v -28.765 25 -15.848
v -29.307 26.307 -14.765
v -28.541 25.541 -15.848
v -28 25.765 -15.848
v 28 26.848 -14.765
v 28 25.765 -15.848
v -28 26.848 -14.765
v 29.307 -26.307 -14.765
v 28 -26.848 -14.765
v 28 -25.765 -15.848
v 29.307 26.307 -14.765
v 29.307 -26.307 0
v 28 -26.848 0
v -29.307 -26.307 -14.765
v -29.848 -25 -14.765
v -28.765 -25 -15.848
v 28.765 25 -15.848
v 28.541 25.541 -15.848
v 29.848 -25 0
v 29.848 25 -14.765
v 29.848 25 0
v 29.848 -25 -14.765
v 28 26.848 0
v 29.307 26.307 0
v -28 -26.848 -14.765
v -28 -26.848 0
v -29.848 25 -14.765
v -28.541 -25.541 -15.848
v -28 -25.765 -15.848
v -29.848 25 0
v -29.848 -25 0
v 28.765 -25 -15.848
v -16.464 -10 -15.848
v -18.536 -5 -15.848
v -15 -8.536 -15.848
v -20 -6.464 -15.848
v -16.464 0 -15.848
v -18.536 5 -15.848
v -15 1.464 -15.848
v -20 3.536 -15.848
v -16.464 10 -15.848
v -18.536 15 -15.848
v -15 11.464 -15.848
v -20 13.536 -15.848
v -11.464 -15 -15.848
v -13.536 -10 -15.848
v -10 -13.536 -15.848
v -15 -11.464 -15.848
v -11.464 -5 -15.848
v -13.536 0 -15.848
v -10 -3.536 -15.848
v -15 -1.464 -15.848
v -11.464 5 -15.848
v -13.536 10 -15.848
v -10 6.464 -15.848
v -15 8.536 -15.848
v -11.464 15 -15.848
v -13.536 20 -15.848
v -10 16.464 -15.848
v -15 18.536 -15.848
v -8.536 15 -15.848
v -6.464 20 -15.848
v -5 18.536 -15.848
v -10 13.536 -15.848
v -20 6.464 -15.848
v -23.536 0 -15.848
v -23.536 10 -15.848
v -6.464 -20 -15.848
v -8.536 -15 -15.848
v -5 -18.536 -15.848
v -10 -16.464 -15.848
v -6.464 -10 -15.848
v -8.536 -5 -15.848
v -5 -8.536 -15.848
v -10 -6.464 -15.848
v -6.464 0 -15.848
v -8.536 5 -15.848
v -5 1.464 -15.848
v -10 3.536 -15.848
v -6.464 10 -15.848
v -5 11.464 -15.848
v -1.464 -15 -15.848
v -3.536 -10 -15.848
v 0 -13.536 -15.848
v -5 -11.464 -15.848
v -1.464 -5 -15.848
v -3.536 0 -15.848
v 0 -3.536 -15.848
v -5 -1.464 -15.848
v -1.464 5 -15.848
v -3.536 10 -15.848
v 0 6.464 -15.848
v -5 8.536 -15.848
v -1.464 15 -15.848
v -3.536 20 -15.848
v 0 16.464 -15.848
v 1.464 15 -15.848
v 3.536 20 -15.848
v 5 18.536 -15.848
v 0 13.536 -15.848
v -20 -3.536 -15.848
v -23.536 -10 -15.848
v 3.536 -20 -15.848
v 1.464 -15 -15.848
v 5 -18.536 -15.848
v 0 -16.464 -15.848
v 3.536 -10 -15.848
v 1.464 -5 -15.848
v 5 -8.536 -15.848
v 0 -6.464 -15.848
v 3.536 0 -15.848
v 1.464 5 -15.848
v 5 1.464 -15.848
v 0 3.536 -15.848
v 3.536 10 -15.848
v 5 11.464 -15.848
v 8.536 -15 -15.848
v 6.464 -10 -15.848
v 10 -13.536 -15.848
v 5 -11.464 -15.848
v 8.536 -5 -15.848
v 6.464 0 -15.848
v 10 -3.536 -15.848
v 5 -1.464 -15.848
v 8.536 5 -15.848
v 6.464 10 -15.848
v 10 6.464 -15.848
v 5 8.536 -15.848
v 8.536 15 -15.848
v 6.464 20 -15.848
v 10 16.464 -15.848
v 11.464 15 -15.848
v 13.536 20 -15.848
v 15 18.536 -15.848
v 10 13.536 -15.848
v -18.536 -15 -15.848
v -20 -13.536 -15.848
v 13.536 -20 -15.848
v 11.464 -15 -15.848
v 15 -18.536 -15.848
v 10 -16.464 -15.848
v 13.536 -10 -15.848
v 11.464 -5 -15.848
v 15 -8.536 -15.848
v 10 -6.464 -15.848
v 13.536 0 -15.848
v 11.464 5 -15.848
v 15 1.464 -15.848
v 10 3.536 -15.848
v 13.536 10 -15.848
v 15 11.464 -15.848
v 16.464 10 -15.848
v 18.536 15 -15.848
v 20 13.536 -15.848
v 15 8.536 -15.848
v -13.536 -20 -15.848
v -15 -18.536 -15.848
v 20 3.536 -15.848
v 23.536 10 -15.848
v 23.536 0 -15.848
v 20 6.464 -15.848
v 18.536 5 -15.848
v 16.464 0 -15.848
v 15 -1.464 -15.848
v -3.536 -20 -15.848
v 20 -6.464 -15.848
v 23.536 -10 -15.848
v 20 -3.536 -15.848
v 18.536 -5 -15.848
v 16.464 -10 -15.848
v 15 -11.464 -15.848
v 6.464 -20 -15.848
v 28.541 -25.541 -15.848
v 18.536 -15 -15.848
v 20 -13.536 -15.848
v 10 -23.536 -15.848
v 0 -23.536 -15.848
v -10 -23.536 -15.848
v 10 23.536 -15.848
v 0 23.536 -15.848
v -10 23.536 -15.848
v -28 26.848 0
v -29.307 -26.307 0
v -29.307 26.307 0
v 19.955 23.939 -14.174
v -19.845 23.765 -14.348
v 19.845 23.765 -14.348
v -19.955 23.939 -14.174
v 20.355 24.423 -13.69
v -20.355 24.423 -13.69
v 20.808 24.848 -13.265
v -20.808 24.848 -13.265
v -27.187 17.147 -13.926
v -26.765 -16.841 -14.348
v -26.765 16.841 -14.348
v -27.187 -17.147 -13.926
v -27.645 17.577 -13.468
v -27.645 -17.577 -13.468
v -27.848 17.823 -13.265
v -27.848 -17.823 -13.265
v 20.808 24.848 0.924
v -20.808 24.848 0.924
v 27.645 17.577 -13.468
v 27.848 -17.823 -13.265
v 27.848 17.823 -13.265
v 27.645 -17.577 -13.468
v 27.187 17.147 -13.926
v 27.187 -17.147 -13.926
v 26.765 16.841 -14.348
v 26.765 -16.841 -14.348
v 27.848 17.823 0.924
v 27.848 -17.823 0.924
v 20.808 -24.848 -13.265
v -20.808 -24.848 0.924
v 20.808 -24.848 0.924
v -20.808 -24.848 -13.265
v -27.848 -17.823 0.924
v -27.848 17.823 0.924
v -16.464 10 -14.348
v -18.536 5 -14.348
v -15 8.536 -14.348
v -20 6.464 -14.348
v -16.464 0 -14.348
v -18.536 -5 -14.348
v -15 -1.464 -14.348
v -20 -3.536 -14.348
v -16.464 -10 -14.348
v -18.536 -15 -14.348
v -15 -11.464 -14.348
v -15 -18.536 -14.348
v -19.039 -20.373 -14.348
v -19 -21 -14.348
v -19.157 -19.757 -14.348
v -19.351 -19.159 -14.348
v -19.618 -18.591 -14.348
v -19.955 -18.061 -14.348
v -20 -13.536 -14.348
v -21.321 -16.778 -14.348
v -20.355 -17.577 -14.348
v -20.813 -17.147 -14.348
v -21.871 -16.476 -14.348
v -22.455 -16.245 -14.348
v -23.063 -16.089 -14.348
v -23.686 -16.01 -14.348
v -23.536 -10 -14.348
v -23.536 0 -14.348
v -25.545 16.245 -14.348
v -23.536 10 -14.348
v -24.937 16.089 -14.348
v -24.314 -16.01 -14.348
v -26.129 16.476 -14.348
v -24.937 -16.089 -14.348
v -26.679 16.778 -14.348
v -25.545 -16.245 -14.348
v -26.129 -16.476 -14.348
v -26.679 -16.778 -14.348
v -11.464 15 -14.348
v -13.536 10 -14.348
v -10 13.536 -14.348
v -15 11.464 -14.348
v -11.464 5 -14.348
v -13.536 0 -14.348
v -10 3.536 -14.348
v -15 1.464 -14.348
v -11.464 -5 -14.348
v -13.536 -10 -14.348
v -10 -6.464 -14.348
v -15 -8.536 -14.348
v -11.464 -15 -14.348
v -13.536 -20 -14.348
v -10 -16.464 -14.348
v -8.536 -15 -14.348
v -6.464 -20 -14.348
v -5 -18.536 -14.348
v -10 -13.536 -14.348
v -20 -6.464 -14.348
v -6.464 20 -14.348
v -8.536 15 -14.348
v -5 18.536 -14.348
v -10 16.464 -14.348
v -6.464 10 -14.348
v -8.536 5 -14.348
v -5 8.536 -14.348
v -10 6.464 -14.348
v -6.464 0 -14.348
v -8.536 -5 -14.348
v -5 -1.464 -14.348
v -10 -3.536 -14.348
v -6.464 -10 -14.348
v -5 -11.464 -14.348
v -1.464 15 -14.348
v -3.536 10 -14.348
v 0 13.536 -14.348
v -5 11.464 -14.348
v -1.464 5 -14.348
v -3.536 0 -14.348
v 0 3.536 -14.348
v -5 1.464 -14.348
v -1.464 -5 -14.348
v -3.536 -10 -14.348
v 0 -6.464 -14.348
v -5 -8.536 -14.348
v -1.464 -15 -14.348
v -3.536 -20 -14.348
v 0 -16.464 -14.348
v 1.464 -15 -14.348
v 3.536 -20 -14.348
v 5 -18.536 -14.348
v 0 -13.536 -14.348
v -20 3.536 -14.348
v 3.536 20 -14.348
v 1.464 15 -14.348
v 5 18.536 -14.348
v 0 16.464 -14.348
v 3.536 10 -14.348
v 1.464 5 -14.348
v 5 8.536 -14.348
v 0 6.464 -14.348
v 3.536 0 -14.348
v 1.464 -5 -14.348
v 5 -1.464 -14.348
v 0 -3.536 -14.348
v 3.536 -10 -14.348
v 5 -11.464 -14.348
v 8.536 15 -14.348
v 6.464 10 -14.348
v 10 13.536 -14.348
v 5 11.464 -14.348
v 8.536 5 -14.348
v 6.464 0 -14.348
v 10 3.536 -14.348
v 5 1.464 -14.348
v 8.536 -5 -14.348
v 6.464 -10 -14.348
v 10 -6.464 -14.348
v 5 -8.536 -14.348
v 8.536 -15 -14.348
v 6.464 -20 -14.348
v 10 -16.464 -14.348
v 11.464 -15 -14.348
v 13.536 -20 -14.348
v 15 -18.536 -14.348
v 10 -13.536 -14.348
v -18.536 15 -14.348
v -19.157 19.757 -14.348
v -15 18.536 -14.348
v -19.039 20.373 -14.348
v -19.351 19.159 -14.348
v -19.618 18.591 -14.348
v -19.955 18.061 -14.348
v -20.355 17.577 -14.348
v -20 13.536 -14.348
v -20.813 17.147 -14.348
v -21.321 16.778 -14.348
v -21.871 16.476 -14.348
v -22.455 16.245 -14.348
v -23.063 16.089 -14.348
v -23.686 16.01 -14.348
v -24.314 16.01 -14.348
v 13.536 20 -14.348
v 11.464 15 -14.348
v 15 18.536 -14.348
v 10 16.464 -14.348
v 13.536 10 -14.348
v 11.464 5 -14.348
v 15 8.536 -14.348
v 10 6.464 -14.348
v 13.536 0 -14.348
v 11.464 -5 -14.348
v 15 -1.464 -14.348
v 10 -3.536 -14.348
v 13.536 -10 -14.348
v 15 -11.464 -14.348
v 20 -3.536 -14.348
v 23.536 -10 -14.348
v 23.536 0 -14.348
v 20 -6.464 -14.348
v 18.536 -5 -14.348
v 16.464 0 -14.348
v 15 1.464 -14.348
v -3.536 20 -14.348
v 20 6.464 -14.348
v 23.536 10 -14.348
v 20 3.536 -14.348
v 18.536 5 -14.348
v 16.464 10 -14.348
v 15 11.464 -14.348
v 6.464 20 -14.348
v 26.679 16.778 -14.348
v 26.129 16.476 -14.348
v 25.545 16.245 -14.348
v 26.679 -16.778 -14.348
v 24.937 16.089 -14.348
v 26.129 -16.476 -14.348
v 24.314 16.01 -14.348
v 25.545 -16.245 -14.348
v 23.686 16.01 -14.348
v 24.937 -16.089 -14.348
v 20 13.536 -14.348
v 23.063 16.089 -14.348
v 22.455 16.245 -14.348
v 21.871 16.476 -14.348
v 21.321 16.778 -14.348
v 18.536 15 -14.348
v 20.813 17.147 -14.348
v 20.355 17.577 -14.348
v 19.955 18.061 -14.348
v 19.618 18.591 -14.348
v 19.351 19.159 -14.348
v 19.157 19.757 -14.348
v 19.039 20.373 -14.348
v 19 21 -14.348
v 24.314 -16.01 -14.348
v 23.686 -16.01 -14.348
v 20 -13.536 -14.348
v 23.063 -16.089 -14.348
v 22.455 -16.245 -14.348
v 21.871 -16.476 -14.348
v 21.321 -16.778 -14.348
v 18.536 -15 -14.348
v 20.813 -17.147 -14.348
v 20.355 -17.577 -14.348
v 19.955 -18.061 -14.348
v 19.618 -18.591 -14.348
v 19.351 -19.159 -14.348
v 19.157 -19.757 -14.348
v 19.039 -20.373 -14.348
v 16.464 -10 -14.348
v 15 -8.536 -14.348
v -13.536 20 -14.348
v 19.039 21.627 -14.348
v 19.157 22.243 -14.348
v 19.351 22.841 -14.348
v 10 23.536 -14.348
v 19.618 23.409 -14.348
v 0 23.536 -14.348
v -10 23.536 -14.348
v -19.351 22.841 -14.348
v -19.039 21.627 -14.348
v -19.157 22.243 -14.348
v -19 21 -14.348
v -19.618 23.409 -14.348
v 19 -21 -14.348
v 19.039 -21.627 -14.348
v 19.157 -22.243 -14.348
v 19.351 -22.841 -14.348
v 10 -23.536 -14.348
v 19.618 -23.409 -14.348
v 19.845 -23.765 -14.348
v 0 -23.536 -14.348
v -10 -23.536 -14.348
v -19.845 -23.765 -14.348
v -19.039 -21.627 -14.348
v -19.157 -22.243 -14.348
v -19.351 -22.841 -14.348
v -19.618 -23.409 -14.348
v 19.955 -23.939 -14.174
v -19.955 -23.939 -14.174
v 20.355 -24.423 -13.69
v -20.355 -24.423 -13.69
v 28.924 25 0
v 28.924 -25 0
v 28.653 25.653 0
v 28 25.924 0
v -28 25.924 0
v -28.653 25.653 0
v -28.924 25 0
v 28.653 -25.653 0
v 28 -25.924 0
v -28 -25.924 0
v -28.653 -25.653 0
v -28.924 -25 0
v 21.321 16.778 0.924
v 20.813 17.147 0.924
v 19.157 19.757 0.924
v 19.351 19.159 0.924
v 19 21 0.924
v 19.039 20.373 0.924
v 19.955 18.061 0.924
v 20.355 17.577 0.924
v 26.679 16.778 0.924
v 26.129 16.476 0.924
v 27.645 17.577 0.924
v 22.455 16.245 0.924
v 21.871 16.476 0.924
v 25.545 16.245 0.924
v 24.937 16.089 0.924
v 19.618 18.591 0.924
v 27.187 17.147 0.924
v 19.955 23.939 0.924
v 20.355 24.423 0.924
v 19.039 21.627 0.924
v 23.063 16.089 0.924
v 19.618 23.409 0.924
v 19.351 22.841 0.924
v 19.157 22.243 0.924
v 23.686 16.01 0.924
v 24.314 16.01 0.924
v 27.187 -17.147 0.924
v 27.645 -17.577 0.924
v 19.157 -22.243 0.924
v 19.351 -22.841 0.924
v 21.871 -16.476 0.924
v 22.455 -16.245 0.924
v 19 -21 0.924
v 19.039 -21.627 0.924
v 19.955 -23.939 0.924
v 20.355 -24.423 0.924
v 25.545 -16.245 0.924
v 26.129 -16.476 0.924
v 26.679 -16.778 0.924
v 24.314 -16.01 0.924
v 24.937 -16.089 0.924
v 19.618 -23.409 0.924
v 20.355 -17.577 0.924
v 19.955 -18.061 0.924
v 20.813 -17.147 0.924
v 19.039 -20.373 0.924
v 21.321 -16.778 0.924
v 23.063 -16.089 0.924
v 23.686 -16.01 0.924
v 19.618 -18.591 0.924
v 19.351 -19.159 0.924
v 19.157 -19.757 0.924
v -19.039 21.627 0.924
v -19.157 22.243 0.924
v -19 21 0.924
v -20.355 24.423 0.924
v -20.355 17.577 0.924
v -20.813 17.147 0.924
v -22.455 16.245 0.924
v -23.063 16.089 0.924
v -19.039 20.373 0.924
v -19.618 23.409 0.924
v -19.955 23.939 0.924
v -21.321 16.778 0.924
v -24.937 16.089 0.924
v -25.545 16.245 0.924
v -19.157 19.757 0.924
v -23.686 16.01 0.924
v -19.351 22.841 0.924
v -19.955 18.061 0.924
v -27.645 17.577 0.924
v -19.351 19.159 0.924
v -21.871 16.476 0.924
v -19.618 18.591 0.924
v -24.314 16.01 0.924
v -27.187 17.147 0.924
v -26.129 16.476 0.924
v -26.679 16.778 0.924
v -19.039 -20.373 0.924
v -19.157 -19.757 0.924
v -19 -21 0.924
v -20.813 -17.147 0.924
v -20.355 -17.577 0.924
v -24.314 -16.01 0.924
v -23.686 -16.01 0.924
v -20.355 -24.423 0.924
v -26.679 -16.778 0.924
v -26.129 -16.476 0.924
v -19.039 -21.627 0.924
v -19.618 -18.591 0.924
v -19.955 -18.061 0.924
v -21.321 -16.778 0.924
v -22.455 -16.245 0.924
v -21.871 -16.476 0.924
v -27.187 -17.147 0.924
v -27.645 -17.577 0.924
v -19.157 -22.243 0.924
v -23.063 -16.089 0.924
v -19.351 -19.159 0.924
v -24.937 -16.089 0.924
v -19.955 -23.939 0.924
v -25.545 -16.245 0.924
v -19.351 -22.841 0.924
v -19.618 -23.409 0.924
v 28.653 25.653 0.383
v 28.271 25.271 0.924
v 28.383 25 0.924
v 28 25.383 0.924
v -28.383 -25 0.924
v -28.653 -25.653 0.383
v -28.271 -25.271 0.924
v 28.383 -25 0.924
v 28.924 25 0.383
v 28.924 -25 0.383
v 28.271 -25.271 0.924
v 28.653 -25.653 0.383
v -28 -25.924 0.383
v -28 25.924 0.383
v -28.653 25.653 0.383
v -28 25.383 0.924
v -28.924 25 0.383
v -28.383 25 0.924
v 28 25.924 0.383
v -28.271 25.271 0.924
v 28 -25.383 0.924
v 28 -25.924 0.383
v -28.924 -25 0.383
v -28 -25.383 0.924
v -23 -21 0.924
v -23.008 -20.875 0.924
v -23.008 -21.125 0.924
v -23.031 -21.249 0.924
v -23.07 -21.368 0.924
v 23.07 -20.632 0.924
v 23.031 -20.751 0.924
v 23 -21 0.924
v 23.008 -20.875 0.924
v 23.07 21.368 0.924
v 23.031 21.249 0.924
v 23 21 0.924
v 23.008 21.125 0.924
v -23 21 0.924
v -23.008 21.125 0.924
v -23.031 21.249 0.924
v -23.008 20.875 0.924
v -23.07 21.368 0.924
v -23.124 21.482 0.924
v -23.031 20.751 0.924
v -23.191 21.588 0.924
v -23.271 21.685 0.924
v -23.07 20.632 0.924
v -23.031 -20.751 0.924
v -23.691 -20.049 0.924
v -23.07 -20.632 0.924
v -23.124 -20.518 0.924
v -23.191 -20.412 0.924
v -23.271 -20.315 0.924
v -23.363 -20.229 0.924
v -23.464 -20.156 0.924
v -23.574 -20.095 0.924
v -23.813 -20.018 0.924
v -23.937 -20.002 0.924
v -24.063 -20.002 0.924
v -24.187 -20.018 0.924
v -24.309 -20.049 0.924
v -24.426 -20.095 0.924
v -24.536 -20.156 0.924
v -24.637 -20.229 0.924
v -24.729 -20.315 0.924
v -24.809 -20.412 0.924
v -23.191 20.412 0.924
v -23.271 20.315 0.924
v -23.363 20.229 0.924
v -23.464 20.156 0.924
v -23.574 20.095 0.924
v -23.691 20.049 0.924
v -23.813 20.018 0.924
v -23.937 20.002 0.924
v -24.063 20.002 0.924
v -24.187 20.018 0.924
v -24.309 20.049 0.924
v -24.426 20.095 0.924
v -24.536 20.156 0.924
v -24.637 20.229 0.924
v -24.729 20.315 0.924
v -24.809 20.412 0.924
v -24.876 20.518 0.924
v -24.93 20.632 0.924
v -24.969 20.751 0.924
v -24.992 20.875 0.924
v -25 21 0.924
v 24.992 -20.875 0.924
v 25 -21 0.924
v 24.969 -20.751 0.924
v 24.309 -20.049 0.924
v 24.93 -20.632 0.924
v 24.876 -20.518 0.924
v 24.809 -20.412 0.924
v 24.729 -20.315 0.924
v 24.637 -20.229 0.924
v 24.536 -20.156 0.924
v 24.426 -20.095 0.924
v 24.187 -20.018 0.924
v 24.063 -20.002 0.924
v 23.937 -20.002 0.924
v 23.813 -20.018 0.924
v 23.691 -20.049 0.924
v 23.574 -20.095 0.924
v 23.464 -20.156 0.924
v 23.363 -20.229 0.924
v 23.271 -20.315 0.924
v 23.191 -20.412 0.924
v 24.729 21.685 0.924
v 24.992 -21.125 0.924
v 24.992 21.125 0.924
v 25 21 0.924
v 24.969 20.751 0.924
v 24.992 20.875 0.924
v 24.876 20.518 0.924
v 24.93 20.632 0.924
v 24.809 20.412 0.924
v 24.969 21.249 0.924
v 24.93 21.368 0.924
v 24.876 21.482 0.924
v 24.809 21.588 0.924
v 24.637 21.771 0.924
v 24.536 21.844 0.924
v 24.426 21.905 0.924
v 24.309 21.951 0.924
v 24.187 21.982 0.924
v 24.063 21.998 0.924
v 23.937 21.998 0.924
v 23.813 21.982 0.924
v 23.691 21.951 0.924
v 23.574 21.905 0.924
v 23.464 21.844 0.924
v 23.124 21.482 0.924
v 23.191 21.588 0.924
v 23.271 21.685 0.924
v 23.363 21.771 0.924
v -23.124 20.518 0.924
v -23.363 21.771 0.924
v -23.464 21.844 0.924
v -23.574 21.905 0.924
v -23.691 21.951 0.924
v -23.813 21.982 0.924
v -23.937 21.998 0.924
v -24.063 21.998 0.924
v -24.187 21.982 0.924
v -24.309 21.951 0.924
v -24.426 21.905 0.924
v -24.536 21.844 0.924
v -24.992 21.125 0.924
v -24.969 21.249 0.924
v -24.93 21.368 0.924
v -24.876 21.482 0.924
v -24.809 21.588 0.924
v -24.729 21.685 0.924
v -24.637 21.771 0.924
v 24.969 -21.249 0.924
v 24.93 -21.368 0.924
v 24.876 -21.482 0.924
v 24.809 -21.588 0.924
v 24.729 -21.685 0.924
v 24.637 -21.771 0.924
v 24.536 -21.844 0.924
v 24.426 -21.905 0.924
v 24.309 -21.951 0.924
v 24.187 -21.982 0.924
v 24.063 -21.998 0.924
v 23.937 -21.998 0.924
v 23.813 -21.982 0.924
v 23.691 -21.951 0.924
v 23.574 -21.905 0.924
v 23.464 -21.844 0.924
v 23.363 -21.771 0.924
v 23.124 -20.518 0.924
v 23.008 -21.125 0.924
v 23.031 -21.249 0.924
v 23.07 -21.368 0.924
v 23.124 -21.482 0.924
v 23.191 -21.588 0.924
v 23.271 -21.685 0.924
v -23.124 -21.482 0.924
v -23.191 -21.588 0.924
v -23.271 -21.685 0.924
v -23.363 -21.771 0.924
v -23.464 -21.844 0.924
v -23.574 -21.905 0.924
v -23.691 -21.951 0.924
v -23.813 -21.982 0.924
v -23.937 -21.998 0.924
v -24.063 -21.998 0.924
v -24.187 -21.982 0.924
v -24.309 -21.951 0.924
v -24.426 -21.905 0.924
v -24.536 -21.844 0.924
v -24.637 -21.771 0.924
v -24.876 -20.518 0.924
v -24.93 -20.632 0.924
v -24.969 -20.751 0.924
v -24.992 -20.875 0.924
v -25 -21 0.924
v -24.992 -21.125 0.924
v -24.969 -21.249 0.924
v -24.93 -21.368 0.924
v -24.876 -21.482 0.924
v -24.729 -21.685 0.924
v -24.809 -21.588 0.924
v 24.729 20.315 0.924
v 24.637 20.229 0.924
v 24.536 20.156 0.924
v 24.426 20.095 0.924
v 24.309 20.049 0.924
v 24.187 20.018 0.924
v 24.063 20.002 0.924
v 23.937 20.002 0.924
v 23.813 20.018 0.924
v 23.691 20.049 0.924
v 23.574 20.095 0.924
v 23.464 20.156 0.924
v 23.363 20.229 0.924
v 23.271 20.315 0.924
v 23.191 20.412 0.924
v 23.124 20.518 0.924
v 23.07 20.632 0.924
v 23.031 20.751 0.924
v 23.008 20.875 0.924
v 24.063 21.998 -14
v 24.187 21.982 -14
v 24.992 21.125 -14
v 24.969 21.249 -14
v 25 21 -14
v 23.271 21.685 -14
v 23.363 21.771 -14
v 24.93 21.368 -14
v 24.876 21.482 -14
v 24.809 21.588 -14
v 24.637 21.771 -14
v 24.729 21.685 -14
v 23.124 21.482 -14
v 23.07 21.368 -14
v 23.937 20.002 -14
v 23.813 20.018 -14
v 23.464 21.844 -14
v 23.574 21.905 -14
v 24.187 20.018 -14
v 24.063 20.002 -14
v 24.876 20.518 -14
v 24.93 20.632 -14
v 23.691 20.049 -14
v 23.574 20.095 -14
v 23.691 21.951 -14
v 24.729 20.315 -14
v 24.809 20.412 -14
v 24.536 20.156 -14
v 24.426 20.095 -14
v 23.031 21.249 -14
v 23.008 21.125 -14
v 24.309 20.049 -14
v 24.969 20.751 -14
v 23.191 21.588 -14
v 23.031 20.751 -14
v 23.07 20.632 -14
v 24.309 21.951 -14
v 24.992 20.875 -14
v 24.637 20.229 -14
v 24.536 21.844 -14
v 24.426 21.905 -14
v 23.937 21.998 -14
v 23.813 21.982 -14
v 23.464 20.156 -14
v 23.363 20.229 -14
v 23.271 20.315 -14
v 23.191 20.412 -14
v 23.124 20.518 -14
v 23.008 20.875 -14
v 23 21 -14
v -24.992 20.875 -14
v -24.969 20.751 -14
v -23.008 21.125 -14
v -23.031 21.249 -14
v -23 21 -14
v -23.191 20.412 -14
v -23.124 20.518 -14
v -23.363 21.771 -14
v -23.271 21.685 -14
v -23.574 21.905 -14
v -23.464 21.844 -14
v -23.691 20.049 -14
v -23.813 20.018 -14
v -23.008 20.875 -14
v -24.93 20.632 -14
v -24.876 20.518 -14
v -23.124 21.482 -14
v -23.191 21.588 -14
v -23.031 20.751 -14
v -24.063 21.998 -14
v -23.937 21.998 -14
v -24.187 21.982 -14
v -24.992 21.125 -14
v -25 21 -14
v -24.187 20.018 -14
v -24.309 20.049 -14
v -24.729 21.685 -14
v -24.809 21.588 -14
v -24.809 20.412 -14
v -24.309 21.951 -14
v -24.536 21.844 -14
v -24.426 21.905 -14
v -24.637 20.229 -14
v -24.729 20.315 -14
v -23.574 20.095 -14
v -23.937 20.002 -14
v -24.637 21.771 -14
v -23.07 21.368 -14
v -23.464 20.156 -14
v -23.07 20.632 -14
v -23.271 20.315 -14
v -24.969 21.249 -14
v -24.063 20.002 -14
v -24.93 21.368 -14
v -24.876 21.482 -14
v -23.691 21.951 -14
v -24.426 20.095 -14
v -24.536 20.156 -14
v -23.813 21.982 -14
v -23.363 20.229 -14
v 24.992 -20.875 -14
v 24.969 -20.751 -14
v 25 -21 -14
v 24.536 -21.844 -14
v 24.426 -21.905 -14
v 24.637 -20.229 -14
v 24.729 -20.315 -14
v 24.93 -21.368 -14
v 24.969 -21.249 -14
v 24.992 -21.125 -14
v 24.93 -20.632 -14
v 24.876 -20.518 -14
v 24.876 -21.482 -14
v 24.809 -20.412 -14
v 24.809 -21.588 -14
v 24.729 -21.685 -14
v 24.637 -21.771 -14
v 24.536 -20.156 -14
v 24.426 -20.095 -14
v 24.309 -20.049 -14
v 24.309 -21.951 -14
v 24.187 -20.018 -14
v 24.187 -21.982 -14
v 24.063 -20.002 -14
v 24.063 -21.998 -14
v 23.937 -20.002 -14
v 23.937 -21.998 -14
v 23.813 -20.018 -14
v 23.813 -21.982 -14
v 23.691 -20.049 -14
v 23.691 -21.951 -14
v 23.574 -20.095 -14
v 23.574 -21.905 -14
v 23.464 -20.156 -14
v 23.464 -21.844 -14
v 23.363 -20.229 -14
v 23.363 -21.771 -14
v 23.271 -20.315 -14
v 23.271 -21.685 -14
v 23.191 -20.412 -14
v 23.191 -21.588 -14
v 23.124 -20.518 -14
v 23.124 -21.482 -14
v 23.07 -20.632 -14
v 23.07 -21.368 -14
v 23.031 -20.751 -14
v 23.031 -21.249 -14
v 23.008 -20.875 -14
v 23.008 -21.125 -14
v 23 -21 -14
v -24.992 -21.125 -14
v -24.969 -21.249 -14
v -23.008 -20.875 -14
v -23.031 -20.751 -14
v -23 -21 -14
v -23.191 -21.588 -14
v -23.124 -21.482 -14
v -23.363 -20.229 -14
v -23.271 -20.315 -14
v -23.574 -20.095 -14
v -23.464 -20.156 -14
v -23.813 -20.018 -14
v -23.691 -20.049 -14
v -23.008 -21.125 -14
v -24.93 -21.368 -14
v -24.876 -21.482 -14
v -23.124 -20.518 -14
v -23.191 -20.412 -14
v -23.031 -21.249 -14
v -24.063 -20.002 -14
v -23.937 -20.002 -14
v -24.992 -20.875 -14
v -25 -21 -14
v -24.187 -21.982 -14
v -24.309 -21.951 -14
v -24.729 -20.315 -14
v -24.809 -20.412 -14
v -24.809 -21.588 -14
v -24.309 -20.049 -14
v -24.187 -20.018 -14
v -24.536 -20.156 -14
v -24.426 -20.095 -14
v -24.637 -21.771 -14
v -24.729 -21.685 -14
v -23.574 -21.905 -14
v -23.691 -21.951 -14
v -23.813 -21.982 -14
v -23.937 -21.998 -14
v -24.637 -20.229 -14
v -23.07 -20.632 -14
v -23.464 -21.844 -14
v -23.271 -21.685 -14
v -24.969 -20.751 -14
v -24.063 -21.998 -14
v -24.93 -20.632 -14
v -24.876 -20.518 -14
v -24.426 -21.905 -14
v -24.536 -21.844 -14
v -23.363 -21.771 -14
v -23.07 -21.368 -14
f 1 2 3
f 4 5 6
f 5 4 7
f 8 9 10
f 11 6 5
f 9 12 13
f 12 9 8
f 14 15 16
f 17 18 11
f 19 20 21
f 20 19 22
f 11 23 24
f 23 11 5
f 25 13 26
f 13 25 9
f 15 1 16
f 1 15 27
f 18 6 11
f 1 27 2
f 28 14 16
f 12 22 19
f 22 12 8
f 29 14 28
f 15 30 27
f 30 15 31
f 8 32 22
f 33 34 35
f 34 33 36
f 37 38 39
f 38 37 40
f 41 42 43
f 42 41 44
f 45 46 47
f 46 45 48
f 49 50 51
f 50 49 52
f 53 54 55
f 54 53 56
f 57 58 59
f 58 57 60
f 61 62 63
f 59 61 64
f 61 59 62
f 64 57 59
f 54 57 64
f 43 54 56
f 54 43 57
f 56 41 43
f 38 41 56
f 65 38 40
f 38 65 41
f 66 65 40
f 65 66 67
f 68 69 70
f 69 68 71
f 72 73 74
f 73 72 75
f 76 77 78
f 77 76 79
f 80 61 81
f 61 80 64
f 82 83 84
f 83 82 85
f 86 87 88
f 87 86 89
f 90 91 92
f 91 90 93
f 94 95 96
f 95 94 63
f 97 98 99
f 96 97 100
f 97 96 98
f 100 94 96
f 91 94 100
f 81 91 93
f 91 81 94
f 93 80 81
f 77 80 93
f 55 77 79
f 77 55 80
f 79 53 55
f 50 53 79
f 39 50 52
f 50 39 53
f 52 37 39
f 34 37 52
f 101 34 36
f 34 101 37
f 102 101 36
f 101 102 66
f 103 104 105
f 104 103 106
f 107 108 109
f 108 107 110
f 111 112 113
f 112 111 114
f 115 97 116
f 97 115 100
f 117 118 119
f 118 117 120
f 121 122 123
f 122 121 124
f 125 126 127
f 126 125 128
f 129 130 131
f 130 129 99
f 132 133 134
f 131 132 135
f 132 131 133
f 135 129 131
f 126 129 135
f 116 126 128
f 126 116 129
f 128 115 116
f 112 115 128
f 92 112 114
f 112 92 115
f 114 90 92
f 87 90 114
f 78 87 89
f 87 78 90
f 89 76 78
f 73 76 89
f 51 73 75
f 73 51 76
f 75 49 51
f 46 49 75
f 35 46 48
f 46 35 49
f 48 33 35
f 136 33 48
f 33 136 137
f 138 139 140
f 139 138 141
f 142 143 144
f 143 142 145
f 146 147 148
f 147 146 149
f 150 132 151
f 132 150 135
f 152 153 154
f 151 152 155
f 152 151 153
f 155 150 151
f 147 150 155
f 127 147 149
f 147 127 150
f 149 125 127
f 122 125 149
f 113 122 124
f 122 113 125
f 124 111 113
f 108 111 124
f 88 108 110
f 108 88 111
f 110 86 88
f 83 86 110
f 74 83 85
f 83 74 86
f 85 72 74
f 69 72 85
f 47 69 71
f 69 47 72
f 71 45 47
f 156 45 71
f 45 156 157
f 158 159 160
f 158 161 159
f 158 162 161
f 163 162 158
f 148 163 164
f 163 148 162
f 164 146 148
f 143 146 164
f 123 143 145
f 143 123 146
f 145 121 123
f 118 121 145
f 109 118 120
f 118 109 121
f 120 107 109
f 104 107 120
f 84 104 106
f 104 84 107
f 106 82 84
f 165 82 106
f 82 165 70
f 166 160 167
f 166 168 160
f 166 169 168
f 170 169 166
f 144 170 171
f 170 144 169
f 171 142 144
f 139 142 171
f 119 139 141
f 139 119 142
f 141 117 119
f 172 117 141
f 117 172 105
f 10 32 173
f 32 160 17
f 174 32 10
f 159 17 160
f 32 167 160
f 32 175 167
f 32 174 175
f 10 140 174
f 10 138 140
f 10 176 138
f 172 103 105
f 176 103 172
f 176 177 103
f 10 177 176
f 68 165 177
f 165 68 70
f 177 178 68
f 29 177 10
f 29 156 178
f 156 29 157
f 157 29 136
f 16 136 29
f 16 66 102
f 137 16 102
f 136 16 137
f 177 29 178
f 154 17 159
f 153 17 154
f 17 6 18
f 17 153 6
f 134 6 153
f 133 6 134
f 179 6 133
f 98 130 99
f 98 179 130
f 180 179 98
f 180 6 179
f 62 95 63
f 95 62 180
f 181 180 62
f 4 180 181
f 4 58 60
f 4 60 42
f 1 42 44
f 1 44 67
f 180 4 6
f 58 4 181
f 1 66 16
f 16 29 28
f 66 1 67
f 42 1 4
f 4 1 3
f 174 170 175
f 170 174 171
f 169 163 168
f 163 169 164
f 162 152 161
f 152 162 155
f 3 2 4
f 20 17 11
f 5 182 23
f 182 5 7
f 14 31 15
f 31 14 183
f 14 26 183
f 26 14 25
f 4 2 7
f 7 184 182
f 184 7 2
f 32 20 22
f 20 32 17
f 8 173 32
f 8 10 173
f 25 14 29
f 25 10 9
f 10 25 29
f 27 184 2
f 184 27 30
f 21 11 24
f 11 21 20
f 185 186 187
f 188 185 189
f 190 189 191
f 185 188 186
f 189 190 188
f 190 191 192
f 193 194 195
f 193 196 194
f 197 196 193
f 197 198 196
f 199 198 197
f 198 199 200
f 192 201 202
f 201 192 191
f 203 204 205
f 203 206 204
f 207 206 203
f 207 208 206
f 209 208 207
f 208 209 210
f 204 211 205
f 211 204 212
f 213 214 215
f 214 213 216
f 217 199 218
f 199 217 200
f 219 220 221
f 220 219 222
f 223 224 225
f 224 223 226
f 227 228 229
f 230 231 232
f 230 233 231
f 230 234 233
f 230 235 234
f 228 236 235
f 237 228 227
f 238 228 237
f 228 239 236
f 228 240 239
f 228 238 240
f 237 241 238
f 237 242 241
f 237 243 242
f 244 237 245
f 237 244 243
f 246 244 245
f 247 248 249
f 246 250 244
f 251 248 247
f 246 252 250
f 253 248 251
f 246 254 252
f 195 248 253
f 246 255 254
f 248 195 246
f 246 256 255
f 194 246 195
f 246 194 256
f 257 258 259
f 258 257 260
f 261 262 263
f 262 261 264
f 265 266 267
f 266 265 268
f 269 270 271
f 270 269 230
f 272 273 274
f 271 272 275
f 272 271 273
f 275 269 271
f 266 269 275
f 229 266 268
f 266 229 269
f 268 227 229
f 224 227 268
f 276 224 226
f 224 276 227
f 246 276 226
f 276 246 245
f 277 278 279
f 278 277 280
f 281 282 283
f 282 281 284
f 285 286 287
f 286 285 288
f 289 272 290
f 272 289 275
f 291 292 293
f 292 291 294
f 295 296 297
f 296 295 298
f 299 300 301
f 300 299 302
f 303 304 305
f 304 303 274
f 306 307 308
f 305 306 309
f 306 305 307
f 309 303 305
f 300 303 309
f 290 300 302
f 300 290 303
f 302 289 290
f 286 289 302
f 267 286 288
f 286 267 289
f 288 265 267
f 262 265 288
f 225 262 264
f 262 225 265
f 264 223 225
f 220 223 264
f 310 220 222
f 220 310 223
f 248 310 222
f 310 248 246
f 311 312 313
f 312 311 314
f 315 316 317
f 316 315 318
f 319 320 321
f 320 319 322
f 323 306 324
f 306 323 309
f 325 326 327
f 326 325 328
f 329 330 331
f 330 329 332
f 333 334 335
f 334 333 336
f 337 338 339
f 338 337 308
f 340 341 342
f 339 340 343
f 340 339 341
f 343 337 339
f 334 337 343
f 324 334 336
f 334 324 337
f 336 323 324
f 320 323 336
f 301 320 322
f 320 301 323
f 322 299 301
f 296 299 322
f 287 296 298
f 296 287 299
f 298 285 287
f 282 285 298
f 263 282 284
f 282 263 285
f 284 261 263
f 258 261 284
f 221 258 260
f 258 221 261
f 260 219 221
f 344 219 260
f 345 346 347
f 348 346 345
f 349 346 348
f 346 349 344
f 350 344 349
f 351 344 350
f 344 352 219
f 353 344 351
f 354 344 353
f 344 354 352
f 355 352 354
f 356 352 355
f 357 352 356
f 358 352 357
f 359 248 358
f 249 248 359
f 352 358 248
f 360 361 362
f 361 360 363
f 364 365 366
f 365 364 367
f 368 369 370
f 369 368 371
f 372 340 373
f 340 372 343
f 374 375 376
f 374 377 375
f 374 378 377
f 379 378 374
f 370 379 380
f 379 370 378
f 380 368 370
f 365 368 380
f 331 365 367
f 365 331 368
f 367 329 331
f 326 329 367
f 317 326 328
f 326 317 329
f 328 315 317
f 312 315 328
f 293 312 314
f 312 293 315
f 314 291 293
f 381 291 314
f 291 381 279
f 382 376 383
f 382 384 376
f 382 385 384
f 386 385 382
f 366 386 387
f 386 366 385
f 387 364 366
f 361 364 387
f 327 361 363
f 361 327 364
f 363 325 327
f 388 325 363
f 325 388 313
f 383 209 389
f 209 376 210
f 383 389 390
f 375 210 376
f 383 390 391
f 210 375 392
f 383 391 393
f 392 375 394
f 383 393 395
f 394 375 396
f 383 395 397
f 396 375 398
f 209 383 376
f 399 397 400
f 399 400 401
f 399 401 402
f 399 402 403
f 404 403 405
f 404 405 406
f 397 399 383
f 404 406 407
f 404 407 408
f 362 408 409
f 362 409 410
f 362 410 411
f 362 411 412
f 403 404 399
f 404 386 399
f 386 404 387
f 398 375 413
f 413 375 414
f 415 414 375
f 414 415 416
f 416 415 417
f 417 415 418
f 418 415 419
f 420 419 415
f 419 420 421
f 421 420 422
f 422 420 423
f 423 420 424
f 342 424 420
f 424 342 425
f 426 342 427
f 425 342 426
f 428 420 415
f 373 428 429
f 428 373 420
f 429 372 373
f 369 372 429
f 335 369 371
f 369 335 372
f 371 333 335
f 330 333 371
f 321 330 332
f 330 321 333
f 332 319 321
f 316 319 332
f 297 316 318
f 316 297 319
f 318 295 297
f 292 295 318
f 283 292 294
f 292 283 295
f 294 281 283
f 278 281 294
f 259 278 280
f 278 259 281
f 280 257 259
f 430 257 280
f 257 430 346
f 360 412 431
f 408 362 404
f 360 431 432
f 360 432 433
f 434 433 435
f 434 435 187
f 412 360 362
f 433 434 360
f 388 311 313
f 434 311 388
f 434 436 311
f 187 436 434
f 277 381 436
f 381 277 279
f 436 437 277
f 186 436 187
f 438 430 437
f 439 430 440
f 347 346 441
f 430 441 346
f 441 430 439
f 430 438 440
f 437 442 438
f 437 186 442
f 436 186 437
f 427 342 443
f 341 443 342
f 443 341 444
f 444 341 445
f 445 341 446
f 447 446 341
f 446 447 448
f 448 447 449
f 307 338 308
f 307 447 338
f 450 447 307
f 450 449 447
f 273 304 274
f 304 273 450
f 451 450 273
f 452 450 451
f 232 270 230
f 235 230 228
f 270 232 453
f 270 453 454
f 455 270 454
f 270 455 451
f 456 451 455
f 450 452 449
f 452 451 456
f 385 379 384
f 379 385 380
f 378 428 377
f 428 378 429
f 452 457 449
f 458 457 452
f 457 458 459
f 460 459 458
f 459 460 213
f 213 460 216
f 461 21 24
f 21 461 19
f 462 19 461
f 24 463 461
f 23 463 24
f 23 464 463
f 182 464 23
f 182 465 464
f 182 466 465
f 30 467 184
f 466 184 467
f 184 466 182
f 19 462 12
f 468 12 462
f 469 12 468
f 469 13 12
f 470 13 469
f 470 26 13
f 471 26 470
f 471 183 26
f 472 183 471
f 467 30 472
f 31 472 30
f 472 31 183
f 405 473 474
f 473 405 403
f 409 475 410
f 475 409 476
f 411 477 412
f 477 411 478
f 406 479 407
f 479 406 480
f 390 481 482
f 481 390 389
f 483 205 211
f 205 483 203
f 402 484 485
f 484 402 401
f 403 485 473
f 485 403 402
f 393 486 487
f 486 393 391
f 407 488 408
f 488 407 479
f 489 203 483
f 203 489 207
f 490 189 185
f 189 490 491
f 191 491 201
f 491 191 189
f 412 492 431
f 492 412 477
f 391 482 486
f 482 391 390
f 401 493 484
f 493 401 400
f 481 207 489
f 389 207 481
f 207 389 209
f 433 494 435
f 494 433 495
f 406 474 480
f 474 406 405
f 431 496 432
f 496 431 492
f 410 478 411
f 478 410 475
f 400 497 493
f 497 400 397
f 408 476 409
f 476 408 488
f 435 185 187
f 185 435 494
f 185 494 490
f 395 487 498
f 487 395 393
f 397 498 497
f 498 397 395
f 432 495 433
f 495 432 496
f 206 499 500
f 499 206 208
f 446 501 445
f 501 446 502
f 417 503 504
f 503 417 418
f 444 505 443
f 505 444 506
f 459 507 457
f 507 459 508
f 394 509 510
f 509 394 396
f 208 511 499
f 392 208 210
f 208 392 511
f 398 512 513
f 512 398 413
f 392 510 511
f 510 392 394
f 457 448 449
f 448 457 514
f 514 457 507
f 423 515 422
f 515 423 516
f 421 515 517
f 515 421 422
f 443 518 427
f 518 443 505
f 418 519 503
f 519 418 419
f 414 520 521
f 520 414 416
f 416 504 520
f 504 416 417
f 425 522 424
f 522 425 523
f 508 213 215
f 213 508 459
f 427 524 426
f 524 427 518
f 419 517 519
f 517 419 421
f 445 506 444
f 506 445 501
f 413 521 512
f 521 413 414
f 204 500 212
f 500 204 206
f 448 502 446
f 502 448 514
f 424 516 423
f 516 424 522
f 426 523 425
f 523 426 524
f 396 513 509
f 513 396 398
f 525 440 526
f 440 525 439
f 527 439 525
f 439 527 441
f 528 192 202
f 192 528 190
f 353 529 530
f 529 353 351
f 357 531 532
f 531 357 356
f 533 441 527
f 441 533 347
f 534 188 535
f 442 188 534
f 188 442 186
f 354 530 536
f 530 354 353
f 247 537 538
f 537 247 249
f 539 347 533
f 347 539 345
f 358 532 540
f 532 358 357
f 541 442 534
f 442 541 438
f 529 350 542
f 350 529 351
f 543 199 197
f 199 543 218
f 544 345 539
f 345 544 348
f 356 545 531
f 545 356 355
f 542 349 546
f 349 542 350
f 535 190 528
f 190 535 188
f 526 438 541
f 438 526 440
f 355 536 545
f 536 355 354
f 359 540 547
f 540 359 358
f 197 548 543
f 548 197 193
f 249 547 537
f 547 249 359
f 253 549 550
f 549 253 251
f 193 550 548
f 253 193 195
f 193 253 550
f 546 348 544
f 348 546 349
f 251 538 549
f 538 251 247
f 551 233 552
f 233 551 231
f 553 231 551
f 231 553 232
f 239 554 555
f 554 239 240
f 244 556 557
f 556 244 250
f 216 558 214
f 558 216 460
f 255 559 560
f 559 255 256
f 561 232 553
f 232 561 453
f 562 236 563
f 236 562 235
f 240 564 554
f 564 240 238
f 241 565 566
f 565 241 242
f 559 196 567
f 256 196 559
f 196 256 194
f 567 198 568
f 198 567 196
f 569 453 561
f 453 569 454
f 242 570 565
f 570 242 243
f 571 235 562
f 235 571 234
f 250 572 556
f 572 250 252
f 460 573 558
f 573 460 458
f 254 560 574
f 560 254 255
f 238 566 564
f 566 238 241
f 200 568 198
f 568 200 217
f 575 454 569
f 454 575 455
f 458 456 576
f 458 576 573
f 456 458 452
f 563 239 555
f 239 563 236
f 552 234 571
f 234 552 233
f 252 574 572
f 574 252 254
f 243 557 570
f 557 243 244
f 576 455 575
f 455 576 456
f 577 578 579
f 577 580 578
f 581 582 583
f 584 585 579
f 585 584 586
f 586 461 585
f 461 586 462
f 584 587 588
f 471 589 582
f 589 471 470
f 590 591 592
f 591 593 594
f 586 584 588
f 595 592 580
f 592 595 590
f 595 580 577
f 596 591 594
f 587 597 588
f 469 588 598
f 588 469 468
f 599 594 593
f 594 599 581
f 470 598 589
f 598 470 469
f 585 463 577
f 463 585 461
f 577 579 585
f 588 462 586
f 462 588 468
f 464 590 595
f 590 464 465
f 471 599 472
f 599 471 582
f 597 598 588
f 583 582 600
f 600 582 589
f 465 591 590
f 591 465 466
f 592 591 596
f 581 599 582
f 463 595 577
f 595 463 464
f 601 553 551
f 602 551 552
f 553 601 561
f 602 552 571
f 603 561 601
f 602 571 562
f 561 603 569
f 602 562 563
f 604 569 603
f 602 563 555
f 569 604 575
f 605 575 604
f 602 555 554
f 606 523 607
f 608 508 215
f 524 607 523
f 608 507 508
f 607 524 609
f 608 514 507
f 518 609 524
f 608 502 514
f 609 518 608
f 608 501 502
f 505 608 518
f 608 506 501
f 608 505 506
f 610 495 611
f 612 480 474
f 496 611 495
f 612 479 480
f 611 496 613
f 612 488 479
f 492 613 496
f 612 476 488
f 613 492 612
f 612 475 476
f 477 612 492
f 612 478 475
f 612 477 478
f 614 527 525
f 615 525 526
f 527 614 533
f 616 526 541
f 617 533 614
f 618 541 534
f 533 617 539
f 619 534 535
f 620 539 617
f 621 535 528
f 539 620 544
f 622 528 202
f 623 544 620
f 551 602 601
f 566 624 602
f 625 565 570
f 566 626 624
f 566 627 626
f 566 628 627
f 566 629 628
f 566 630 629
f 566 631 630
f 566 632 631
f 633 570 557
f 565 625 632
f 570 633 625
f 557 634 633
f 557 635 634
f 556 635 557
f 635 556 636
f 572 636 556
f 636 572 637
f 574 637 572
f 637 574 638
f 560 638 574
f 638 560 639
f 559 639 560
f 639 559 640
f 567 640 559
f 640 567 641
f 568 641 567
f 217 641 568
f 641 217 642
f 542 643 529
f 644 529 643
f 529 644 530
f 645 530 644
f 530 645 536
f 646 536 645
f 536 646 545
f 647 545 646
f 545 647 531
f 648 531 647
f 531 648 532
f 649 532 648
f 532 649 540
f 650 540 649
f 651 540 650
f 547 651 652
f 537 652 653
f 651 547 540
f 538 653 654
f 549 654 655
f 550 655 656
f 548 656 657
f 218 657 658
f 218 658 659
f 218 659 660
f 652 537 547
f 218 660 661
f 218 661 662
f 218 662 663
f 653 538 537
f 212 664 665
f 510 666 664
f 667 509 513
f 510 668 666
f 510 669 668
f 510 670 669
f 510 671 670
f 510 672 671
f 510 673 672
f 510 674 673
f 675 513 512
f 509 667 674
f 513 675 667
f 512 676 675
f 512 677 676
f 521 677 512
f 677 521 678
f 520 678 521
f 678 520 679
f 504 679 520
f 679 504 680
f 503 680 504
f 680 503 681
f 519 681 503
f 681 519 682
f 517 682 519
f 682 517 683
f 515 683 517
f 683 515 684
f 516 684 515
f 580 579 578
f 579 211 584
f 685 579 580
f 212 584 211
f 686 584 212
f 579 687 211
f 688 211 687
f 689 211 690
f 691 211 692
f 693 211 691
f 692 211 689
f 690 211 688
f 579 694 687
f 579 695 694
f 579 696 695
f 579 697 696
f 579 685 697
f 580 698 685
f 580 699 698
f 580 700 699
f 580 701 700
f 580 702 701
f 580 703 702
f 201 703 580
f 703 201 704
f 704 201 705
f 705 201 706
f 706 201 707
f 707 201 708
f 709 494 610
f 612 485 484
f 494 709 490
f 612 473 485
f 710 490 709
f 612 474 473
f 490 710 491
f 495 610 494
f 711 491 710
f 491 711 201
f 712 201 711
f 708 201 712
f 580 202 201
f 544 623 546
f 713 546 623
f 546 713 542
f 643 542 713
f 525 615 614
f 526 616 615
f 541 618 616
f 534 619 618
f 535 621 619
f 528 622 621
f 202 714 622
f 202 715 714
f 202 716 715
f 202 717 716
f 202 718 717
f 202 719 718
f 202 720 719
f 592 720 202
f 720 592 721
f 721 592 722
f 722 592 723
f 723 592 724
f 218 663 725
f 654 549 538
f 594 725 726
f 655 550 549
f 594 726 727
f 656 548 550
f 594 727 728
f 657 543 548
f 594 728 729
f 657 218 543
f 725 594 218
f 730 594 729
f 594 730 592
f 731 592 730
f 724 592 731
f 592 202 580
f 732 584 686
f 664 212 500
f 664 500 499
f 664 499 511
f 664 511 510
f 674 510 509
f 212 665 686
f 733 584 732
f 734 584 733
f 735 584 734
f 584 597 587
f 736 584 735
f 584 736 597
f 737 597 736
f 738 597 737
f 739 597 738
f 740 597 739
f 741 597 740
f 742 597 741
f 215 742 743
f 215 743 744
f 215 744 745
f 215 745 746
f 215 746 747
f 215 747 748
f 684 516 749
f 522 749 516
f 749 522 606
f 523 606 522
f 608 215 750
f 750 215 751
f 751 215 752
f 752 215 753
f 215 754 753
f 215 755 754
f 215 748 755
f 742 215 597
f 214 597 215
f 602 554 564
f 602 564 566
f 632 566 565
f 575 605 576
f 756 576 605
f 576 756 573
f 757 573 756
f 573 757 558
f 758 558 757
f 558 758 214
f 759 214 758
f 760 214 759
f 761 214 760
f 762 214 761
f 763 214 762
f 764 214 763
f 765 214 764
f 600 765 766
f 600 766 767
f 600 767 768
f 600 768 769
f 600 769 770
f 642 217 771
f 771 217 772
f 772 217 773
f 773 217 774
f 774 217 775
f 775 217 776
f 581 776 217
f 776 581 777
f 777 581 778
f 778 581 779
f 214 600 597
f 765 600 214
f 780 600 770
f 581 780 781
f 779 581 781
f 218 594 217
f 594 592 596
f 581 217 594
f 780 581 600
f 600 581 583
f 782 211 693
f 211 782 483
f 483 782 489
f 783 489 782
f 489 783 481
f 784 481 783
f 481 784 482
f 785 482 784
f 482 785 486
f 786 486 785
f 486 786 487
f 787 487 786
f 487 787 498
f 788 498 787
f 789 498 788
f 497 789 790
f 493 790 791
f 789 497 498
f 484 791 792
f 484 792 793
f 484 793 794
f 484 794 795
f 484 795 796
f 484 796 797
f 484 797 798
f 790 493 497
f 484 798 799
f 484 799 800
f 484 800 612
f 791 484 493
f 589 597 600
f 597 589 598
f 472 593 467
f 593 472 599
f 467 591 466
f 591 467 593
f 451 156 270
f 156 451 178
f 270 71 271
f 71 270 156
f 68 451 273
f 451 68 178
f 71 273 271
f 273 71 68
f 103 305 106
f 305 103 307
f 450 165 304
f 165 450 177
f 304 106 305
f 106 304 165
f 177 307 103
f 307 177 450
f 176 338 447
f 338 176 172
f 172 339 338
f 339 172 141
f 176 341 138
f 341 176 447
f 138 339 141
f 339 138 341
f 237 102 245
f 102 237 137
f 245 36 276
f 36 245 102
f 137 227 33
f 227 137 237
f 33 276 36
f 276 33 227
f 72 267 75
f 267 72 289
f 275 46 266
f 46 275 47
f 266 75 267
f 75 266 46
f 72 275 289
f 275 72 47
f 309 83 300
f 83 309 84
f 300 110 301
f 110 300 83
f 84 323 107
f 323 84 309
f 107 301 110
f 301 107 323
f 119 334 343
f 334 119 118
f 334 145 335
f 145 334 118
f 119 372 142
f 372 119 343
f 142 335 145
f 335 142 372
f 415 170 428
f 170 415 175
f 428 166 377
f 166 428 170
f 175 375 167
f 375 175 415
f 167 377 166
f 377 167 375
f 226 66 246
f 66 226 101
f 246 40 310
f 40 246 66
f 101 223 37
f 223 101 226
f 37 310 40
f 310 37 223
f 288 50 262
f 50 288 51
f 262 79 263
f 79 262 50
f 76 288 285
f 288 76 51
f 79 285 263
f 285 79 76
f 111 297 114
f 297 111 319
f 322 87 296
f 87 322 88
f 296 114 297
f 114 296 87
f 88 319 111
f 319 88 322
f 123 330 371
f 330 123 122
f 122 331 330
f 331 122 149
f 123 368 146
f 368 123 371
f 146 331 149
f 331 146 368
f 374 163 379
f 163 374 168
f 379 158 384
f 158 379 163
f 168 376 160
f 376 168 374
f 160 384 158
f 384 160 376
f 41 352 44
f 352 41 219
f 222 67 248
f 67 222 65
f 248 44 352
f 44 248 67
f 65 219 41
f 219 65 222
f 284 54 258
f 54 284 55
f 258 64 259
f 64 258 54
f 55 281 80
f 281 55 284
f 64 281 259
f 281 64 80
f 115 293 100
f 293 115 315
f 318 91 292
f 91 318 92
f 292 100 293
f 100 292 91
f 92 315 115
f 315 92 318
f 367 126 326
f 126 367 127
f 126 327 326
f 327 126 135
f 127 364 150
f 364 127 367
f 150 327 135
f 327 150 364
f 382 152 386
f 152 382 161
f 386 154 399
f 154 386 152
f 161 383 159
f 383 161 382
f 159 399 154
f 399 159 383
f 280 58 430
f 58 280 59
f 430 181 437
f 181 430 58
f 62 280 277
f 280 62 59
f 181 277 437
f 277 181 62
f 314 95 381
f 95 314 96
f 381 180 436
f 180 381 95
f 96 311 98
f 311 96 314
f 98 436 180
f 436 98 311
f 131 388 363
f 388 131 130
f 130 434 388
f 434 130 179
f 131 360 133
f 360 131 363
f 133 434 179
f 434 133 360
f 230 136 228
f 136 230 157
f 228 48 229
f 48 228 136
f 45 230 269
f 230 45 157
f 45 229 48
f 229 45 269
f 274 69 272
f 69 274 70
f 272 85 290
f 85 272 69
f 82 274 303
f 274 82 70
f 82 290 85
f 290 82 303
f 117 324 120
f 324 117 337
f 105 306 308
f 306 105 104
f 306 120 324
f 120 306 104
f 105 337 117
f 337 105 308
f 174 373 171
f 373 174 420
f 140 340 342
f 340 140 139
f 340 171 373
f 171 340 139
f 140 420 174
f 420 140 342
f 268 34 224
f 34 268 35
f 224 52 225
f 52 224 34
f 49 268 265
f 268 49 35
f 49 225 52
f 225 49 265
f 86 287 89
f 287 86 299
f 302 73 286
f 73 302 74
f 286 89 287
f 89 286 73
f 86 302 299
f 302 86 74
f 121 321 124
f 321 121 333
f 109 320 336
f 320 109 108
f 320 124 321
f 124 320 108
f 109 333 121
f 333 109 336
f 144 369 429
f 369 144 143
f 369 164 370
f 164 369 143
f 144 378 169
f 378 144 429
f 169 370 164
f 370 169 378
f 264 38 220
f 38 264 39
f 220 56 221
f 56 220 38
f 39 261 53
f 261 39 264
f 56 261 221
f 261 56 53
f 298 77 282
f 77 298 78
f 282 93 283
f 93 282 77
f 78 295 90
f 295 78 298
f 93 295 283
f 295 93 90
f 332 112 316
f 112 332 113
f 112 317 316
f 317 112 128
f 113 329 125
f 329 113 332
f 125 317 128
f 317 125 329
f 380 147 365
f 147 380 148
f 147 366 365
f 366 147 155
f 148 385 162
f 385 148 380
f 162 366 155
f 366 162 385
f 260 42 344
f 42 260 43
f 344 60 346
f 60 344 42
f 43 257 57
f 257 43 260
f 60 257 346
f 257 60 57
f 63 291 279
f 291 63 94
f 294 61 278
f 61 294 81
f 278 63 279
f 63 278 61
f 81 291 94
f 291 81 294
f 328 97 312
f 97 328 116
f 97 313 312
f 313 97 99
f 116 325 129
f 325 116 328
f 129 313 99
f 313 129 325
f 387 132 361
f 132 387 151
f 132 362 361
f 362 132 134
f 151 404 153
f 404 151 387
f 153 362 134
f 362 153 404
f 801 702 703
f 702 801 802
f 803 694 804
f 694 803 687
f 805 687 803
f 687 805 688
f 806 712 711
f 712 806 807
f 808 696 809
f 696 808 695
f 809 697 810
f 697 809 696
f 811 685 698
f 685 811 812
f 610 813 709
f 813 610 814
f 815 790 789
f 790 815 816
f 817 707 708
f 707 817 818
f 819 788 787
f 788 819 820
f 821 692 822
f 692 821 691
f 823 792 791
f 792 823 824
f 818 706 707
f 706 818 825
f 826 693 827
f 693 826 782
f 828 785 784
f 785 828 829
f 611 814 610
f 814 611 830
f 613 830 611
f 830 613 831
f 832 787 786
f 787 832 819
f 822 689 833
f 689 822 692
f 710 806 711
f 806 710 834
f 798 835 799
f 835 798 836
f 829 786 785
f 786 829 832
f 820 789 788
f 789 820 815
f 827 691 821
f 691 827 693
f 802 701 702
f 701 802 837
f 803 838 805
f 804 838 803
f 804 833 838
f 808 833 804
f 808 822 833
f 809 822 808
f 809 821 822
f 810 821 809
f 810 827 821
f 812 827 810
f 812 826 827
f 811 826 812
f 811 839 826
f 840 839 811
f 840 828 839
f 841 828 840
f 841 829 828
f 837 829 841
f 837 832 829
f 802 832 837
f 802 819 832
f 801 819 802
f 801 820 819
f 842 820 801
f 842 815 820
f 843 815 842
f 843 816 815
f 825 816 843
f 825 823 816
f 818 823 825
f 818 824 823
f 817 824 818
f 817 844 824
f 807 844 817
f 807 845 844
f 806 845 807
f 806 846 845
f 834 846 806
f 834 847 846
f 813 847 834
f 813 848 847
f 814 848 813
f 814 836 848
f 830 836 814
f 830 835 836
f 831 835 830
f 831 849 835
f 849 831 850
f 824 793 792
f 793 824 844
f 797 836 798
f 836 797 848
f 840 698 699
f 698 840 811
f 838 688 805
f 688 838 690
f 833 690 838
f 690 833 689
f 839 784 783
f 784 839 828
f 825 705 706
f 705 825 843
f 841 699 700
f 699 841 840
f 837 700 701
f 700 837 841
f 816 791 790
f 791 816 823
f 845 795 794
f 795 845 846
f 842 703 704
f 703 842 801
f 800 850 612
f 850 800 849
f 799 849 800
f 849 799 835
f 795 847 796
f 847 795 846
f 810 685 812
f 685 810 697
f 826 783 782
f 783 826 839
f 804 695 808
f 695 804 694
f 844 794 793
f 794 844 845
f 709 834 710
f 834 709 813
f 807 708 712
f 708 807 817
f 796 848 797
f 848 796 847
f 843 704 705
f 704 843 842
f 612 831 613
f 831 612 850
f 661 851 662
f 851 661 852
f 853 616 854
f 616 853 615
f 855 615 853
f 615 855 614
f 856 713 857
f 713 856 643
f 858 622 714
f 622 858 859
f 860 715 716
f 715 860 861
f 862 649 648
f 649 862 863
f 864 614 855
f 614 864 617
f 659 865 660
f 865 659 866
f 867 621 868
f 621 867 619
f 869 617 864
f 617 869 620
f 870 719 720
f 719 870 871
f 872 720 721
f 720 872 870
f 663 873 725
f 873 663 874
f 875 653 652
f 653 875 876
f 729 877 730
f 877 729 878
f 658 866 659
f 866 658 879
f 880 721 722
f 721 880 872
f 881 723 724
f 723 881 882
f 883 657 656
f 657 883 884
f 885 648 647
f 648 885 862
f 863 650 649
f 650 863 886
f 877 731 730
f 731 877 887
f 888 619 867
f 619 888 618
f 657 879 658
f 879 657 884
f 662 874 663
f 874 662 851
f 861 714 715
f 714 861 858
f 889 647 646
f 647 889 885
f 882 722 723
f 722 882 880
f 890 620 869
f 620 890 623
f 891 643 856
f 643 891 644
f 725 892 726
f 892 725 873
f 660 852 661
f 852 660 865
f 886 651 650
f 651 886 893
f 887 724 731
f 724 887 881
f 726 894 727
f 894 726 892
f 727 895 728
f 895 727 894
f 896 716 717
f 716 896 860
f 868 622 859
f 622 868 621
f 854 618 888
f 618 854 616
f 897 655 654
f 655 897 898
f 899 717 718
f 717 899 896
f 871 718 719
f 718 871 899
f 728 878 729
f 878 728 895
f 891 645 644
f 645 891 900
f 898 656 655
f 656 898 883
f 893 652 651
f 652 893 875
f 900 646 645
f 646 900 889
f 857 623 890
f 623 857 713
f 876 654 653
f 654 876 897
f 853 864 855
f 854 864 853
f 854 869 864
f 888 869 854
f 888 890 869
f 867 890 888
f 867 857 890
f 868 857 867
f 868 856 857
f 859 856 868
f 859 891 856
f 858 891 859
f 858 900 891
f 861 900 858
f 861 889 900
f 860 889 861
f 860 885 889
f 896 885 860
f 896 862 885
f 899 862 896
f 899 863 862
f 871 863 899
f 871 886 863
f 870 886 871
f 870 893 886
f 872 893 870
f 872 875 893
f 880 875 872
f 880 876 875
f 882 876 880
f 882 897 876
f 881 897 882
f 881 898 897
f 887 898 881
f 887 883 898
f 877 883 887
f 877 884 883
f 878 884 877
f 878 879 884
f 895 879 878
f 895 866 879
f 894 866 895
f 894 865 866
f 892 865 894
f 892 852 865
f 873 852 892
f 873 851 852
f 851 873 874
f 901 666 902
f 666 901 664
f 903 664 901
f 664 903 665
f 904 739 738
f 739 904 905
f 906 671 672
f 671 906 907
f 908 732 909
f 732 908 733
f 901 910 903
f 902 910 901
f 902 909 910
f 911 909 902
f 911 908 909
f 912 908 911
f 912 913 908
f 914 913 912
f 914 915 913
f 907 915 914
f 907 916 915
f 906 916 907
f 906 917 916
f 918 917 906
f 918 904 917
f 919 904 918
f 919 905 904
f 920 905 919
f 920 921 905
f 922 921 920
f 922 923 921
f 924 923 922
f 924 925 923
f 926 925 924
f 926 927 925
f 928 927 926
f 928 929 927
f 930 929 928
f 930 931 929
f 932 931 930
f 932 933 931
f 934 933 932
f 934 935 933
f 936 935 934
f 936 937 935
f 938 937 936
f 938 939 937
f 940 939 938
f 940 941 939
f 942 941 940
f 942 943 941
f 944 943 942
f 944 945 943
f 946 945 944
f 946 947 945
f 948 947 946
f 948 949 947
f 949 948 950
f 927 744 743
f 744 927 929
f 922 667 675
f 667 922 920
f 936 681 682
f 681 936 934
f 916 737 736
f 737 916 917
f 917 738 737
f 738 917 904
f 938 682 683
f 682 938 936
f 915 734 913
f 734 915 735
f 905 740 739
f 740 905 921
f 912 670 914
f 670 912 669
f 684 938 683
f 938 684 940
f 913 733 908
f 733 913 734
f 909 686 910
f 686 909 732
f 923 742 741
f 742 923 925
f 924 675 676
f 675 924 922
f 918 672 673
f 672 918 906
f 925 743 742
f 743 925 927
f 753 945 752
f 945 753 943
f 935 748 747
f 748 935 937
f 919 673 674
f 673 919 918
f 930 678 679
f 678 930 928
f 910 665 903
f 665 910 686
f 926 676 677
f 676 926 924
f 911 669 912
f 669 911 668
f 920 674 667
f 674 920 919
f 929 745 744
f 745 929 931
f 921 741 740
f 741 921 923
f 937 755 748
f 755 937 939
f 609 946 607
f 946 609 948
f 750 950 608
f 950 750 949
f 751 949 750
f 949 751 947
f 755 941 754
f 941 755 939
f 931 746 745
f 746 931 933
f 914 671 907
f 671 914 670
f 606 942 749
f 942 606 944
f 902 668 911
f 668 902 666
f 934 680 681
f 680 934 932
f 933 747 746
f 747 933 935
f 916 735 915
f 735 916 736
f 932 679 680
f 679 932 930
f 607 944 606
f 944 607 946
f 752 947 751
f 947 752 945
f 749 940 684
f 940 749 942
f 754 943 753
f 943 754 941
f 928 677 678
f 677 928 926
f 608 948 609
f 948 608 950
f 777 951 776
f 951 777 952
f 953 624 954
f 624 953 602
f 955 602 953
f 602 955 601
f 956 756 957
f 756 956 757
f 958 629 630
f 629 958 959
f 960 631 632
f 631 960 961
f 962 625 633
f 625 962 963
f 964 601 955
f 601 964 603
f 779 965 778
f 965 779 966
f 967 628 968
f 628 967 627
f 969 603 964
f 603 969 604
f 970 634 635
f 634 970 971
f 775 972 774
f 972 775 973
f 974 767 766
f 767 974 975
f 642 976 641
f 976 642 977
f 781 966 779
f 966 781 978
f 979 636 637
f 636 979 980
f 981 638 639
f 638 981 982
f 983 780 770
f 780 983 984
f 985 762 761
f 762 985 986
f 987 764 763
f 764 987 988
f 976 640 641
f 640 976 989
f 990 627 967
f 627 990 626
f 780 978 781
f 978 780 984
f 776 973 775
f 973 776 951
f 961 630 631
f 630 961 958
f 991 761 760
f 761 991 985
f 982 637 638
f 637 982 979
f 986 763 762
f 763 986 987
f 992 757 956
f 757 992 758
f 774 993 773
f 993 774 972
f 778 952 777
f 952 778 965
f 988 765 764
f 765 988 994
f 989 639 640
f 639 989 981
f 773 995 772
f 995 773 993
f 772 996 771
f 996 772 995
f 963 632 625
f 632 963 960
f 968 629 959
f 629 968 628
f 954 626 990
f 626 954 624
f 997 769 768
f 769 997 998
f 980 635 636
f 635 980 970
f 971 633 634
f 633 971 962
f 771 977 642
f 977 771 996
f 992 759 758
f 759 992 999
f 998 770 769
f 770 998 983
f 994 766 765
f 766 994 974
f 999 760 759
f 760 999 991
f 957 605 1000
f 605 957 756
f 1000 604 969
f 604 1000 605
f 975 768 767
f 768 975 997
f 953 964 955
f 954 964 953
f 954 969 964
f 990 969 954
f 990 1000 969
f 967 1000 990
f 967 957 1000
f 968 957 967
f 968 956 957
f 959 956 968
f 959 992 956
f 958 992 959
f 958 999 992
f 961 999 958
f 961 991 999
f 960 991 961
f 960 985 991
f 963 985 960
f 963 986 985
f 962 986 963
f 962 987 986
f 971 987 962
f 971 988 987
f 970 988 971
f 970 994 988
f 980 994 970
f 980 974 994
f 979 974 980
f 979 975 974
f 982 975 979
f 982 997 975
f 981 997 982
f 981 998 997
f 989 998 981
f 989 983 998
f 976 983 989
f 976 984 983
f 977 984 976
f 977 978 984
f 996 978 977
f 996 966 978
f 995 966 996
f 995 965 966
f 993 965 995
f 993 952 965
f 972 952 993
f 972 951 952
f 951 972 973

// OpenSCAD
body_2();

module body_2() {
    $fn=50;
    difference() {
        union(){

            difference() {
                minkowski(){ 
                    cube([56,50,28], center = true);
                    sphere(2, $fn=8);
                };
                minkowski(){
                    cube([52,46,25], center = true);
                    sphere(2, $fn=8);
                };
                //половиним корпус
                translate([0,0,55/2])
                    color([.9,.3,.1]) cube([90,95,55], center = true);
            };

            intersection(){
                translate([0,0,-27.4/2])
                minkowski(){ 
                    //cube([52,46,27.4], center = true);
                    cube([56,50,27.4], center = true);
                    sphere(1, $fn=8);
                };
                union(){
                    translate([24,21,1]) cylinder(h = 32, d = 10, center = true);
                    translate([24,-21,1]) cylinder(h = 32, d = 10, center = true);
                    translate([-24,21,1]) cylinder(h = 32, d = 10, center = true);
                    translate([-24,-21,1]) cylinder(h = 32, d = 10, center = true);
                    difference() {
                        minkowski(){ 
                            cube([56,50,28], center = true);
                            sphere(2, $fn=8);
                        };
                        minkowski(){
                            cube([52,46,25], center = true);
                            sphere(2, $fn=8);
                        };
                    };
                }
            }
        };

        //debug
        //translate([45/2,0,0]) color([.9,.3,.1]) cube([45,95,55], center = true);
        //translate([45/2 + 24,0,0]) color([.9,.3,.1]) cube([45,95,55], center = true);

        //отверстия под винты крепления половинок корпуса
        translate([24,21,12]) cylinder(h = 52, d = 2, center = true);
        translate([-24,21,12]) cylinder(h = 52, d = 2, center = true);
        translate([24,-21,12]) cylinder(h = 52, d = 2, center = true);
        translate([-24,-21,12]) cylinder(h = 52, d = 2, center = true);

        //щели для вентиляции

        for(y=[-2:2]){
            for(x=[-2:2]){
                if( (x != -2 || y != -2) &&
                     (x != 2 || y != 2) &&
                     (x != -2 || y != 2) &&
                     (x != 2 || y != -2)
                  )
                {
                    translate([x*10,y*10,-10])
                        rotate([0,0,45]) cube([5,5,30], center=true);
                }
            }
        }

        for(y=[-1:2]){
            for(x=[-1:2]){
                translate([x*10-5,y*10-5,-10])
                    rotate([0,0,45]) cube([5,5,30], center=true);
            }
        }


//        translate([0, -30, -45]) union(){
//            translate([0, 0, 0]) cube([30,2,50], center = true);
//            translate([0, 4, 0]) cube([30,2,50], center = true);
//            translate([0, 8, 0]) cube([30,2,50], center = true);
//            translate([0, 12, 0]) cube([30,2,50], center = true);
//            translate([0, 16, 0]) cube([30,2,50], center = true);
//        }

        //debug
        //translate([45/2 -14 ,0,0]) color([.9,.3,.1]) cube([45,95,55], center = true);

    };

};
